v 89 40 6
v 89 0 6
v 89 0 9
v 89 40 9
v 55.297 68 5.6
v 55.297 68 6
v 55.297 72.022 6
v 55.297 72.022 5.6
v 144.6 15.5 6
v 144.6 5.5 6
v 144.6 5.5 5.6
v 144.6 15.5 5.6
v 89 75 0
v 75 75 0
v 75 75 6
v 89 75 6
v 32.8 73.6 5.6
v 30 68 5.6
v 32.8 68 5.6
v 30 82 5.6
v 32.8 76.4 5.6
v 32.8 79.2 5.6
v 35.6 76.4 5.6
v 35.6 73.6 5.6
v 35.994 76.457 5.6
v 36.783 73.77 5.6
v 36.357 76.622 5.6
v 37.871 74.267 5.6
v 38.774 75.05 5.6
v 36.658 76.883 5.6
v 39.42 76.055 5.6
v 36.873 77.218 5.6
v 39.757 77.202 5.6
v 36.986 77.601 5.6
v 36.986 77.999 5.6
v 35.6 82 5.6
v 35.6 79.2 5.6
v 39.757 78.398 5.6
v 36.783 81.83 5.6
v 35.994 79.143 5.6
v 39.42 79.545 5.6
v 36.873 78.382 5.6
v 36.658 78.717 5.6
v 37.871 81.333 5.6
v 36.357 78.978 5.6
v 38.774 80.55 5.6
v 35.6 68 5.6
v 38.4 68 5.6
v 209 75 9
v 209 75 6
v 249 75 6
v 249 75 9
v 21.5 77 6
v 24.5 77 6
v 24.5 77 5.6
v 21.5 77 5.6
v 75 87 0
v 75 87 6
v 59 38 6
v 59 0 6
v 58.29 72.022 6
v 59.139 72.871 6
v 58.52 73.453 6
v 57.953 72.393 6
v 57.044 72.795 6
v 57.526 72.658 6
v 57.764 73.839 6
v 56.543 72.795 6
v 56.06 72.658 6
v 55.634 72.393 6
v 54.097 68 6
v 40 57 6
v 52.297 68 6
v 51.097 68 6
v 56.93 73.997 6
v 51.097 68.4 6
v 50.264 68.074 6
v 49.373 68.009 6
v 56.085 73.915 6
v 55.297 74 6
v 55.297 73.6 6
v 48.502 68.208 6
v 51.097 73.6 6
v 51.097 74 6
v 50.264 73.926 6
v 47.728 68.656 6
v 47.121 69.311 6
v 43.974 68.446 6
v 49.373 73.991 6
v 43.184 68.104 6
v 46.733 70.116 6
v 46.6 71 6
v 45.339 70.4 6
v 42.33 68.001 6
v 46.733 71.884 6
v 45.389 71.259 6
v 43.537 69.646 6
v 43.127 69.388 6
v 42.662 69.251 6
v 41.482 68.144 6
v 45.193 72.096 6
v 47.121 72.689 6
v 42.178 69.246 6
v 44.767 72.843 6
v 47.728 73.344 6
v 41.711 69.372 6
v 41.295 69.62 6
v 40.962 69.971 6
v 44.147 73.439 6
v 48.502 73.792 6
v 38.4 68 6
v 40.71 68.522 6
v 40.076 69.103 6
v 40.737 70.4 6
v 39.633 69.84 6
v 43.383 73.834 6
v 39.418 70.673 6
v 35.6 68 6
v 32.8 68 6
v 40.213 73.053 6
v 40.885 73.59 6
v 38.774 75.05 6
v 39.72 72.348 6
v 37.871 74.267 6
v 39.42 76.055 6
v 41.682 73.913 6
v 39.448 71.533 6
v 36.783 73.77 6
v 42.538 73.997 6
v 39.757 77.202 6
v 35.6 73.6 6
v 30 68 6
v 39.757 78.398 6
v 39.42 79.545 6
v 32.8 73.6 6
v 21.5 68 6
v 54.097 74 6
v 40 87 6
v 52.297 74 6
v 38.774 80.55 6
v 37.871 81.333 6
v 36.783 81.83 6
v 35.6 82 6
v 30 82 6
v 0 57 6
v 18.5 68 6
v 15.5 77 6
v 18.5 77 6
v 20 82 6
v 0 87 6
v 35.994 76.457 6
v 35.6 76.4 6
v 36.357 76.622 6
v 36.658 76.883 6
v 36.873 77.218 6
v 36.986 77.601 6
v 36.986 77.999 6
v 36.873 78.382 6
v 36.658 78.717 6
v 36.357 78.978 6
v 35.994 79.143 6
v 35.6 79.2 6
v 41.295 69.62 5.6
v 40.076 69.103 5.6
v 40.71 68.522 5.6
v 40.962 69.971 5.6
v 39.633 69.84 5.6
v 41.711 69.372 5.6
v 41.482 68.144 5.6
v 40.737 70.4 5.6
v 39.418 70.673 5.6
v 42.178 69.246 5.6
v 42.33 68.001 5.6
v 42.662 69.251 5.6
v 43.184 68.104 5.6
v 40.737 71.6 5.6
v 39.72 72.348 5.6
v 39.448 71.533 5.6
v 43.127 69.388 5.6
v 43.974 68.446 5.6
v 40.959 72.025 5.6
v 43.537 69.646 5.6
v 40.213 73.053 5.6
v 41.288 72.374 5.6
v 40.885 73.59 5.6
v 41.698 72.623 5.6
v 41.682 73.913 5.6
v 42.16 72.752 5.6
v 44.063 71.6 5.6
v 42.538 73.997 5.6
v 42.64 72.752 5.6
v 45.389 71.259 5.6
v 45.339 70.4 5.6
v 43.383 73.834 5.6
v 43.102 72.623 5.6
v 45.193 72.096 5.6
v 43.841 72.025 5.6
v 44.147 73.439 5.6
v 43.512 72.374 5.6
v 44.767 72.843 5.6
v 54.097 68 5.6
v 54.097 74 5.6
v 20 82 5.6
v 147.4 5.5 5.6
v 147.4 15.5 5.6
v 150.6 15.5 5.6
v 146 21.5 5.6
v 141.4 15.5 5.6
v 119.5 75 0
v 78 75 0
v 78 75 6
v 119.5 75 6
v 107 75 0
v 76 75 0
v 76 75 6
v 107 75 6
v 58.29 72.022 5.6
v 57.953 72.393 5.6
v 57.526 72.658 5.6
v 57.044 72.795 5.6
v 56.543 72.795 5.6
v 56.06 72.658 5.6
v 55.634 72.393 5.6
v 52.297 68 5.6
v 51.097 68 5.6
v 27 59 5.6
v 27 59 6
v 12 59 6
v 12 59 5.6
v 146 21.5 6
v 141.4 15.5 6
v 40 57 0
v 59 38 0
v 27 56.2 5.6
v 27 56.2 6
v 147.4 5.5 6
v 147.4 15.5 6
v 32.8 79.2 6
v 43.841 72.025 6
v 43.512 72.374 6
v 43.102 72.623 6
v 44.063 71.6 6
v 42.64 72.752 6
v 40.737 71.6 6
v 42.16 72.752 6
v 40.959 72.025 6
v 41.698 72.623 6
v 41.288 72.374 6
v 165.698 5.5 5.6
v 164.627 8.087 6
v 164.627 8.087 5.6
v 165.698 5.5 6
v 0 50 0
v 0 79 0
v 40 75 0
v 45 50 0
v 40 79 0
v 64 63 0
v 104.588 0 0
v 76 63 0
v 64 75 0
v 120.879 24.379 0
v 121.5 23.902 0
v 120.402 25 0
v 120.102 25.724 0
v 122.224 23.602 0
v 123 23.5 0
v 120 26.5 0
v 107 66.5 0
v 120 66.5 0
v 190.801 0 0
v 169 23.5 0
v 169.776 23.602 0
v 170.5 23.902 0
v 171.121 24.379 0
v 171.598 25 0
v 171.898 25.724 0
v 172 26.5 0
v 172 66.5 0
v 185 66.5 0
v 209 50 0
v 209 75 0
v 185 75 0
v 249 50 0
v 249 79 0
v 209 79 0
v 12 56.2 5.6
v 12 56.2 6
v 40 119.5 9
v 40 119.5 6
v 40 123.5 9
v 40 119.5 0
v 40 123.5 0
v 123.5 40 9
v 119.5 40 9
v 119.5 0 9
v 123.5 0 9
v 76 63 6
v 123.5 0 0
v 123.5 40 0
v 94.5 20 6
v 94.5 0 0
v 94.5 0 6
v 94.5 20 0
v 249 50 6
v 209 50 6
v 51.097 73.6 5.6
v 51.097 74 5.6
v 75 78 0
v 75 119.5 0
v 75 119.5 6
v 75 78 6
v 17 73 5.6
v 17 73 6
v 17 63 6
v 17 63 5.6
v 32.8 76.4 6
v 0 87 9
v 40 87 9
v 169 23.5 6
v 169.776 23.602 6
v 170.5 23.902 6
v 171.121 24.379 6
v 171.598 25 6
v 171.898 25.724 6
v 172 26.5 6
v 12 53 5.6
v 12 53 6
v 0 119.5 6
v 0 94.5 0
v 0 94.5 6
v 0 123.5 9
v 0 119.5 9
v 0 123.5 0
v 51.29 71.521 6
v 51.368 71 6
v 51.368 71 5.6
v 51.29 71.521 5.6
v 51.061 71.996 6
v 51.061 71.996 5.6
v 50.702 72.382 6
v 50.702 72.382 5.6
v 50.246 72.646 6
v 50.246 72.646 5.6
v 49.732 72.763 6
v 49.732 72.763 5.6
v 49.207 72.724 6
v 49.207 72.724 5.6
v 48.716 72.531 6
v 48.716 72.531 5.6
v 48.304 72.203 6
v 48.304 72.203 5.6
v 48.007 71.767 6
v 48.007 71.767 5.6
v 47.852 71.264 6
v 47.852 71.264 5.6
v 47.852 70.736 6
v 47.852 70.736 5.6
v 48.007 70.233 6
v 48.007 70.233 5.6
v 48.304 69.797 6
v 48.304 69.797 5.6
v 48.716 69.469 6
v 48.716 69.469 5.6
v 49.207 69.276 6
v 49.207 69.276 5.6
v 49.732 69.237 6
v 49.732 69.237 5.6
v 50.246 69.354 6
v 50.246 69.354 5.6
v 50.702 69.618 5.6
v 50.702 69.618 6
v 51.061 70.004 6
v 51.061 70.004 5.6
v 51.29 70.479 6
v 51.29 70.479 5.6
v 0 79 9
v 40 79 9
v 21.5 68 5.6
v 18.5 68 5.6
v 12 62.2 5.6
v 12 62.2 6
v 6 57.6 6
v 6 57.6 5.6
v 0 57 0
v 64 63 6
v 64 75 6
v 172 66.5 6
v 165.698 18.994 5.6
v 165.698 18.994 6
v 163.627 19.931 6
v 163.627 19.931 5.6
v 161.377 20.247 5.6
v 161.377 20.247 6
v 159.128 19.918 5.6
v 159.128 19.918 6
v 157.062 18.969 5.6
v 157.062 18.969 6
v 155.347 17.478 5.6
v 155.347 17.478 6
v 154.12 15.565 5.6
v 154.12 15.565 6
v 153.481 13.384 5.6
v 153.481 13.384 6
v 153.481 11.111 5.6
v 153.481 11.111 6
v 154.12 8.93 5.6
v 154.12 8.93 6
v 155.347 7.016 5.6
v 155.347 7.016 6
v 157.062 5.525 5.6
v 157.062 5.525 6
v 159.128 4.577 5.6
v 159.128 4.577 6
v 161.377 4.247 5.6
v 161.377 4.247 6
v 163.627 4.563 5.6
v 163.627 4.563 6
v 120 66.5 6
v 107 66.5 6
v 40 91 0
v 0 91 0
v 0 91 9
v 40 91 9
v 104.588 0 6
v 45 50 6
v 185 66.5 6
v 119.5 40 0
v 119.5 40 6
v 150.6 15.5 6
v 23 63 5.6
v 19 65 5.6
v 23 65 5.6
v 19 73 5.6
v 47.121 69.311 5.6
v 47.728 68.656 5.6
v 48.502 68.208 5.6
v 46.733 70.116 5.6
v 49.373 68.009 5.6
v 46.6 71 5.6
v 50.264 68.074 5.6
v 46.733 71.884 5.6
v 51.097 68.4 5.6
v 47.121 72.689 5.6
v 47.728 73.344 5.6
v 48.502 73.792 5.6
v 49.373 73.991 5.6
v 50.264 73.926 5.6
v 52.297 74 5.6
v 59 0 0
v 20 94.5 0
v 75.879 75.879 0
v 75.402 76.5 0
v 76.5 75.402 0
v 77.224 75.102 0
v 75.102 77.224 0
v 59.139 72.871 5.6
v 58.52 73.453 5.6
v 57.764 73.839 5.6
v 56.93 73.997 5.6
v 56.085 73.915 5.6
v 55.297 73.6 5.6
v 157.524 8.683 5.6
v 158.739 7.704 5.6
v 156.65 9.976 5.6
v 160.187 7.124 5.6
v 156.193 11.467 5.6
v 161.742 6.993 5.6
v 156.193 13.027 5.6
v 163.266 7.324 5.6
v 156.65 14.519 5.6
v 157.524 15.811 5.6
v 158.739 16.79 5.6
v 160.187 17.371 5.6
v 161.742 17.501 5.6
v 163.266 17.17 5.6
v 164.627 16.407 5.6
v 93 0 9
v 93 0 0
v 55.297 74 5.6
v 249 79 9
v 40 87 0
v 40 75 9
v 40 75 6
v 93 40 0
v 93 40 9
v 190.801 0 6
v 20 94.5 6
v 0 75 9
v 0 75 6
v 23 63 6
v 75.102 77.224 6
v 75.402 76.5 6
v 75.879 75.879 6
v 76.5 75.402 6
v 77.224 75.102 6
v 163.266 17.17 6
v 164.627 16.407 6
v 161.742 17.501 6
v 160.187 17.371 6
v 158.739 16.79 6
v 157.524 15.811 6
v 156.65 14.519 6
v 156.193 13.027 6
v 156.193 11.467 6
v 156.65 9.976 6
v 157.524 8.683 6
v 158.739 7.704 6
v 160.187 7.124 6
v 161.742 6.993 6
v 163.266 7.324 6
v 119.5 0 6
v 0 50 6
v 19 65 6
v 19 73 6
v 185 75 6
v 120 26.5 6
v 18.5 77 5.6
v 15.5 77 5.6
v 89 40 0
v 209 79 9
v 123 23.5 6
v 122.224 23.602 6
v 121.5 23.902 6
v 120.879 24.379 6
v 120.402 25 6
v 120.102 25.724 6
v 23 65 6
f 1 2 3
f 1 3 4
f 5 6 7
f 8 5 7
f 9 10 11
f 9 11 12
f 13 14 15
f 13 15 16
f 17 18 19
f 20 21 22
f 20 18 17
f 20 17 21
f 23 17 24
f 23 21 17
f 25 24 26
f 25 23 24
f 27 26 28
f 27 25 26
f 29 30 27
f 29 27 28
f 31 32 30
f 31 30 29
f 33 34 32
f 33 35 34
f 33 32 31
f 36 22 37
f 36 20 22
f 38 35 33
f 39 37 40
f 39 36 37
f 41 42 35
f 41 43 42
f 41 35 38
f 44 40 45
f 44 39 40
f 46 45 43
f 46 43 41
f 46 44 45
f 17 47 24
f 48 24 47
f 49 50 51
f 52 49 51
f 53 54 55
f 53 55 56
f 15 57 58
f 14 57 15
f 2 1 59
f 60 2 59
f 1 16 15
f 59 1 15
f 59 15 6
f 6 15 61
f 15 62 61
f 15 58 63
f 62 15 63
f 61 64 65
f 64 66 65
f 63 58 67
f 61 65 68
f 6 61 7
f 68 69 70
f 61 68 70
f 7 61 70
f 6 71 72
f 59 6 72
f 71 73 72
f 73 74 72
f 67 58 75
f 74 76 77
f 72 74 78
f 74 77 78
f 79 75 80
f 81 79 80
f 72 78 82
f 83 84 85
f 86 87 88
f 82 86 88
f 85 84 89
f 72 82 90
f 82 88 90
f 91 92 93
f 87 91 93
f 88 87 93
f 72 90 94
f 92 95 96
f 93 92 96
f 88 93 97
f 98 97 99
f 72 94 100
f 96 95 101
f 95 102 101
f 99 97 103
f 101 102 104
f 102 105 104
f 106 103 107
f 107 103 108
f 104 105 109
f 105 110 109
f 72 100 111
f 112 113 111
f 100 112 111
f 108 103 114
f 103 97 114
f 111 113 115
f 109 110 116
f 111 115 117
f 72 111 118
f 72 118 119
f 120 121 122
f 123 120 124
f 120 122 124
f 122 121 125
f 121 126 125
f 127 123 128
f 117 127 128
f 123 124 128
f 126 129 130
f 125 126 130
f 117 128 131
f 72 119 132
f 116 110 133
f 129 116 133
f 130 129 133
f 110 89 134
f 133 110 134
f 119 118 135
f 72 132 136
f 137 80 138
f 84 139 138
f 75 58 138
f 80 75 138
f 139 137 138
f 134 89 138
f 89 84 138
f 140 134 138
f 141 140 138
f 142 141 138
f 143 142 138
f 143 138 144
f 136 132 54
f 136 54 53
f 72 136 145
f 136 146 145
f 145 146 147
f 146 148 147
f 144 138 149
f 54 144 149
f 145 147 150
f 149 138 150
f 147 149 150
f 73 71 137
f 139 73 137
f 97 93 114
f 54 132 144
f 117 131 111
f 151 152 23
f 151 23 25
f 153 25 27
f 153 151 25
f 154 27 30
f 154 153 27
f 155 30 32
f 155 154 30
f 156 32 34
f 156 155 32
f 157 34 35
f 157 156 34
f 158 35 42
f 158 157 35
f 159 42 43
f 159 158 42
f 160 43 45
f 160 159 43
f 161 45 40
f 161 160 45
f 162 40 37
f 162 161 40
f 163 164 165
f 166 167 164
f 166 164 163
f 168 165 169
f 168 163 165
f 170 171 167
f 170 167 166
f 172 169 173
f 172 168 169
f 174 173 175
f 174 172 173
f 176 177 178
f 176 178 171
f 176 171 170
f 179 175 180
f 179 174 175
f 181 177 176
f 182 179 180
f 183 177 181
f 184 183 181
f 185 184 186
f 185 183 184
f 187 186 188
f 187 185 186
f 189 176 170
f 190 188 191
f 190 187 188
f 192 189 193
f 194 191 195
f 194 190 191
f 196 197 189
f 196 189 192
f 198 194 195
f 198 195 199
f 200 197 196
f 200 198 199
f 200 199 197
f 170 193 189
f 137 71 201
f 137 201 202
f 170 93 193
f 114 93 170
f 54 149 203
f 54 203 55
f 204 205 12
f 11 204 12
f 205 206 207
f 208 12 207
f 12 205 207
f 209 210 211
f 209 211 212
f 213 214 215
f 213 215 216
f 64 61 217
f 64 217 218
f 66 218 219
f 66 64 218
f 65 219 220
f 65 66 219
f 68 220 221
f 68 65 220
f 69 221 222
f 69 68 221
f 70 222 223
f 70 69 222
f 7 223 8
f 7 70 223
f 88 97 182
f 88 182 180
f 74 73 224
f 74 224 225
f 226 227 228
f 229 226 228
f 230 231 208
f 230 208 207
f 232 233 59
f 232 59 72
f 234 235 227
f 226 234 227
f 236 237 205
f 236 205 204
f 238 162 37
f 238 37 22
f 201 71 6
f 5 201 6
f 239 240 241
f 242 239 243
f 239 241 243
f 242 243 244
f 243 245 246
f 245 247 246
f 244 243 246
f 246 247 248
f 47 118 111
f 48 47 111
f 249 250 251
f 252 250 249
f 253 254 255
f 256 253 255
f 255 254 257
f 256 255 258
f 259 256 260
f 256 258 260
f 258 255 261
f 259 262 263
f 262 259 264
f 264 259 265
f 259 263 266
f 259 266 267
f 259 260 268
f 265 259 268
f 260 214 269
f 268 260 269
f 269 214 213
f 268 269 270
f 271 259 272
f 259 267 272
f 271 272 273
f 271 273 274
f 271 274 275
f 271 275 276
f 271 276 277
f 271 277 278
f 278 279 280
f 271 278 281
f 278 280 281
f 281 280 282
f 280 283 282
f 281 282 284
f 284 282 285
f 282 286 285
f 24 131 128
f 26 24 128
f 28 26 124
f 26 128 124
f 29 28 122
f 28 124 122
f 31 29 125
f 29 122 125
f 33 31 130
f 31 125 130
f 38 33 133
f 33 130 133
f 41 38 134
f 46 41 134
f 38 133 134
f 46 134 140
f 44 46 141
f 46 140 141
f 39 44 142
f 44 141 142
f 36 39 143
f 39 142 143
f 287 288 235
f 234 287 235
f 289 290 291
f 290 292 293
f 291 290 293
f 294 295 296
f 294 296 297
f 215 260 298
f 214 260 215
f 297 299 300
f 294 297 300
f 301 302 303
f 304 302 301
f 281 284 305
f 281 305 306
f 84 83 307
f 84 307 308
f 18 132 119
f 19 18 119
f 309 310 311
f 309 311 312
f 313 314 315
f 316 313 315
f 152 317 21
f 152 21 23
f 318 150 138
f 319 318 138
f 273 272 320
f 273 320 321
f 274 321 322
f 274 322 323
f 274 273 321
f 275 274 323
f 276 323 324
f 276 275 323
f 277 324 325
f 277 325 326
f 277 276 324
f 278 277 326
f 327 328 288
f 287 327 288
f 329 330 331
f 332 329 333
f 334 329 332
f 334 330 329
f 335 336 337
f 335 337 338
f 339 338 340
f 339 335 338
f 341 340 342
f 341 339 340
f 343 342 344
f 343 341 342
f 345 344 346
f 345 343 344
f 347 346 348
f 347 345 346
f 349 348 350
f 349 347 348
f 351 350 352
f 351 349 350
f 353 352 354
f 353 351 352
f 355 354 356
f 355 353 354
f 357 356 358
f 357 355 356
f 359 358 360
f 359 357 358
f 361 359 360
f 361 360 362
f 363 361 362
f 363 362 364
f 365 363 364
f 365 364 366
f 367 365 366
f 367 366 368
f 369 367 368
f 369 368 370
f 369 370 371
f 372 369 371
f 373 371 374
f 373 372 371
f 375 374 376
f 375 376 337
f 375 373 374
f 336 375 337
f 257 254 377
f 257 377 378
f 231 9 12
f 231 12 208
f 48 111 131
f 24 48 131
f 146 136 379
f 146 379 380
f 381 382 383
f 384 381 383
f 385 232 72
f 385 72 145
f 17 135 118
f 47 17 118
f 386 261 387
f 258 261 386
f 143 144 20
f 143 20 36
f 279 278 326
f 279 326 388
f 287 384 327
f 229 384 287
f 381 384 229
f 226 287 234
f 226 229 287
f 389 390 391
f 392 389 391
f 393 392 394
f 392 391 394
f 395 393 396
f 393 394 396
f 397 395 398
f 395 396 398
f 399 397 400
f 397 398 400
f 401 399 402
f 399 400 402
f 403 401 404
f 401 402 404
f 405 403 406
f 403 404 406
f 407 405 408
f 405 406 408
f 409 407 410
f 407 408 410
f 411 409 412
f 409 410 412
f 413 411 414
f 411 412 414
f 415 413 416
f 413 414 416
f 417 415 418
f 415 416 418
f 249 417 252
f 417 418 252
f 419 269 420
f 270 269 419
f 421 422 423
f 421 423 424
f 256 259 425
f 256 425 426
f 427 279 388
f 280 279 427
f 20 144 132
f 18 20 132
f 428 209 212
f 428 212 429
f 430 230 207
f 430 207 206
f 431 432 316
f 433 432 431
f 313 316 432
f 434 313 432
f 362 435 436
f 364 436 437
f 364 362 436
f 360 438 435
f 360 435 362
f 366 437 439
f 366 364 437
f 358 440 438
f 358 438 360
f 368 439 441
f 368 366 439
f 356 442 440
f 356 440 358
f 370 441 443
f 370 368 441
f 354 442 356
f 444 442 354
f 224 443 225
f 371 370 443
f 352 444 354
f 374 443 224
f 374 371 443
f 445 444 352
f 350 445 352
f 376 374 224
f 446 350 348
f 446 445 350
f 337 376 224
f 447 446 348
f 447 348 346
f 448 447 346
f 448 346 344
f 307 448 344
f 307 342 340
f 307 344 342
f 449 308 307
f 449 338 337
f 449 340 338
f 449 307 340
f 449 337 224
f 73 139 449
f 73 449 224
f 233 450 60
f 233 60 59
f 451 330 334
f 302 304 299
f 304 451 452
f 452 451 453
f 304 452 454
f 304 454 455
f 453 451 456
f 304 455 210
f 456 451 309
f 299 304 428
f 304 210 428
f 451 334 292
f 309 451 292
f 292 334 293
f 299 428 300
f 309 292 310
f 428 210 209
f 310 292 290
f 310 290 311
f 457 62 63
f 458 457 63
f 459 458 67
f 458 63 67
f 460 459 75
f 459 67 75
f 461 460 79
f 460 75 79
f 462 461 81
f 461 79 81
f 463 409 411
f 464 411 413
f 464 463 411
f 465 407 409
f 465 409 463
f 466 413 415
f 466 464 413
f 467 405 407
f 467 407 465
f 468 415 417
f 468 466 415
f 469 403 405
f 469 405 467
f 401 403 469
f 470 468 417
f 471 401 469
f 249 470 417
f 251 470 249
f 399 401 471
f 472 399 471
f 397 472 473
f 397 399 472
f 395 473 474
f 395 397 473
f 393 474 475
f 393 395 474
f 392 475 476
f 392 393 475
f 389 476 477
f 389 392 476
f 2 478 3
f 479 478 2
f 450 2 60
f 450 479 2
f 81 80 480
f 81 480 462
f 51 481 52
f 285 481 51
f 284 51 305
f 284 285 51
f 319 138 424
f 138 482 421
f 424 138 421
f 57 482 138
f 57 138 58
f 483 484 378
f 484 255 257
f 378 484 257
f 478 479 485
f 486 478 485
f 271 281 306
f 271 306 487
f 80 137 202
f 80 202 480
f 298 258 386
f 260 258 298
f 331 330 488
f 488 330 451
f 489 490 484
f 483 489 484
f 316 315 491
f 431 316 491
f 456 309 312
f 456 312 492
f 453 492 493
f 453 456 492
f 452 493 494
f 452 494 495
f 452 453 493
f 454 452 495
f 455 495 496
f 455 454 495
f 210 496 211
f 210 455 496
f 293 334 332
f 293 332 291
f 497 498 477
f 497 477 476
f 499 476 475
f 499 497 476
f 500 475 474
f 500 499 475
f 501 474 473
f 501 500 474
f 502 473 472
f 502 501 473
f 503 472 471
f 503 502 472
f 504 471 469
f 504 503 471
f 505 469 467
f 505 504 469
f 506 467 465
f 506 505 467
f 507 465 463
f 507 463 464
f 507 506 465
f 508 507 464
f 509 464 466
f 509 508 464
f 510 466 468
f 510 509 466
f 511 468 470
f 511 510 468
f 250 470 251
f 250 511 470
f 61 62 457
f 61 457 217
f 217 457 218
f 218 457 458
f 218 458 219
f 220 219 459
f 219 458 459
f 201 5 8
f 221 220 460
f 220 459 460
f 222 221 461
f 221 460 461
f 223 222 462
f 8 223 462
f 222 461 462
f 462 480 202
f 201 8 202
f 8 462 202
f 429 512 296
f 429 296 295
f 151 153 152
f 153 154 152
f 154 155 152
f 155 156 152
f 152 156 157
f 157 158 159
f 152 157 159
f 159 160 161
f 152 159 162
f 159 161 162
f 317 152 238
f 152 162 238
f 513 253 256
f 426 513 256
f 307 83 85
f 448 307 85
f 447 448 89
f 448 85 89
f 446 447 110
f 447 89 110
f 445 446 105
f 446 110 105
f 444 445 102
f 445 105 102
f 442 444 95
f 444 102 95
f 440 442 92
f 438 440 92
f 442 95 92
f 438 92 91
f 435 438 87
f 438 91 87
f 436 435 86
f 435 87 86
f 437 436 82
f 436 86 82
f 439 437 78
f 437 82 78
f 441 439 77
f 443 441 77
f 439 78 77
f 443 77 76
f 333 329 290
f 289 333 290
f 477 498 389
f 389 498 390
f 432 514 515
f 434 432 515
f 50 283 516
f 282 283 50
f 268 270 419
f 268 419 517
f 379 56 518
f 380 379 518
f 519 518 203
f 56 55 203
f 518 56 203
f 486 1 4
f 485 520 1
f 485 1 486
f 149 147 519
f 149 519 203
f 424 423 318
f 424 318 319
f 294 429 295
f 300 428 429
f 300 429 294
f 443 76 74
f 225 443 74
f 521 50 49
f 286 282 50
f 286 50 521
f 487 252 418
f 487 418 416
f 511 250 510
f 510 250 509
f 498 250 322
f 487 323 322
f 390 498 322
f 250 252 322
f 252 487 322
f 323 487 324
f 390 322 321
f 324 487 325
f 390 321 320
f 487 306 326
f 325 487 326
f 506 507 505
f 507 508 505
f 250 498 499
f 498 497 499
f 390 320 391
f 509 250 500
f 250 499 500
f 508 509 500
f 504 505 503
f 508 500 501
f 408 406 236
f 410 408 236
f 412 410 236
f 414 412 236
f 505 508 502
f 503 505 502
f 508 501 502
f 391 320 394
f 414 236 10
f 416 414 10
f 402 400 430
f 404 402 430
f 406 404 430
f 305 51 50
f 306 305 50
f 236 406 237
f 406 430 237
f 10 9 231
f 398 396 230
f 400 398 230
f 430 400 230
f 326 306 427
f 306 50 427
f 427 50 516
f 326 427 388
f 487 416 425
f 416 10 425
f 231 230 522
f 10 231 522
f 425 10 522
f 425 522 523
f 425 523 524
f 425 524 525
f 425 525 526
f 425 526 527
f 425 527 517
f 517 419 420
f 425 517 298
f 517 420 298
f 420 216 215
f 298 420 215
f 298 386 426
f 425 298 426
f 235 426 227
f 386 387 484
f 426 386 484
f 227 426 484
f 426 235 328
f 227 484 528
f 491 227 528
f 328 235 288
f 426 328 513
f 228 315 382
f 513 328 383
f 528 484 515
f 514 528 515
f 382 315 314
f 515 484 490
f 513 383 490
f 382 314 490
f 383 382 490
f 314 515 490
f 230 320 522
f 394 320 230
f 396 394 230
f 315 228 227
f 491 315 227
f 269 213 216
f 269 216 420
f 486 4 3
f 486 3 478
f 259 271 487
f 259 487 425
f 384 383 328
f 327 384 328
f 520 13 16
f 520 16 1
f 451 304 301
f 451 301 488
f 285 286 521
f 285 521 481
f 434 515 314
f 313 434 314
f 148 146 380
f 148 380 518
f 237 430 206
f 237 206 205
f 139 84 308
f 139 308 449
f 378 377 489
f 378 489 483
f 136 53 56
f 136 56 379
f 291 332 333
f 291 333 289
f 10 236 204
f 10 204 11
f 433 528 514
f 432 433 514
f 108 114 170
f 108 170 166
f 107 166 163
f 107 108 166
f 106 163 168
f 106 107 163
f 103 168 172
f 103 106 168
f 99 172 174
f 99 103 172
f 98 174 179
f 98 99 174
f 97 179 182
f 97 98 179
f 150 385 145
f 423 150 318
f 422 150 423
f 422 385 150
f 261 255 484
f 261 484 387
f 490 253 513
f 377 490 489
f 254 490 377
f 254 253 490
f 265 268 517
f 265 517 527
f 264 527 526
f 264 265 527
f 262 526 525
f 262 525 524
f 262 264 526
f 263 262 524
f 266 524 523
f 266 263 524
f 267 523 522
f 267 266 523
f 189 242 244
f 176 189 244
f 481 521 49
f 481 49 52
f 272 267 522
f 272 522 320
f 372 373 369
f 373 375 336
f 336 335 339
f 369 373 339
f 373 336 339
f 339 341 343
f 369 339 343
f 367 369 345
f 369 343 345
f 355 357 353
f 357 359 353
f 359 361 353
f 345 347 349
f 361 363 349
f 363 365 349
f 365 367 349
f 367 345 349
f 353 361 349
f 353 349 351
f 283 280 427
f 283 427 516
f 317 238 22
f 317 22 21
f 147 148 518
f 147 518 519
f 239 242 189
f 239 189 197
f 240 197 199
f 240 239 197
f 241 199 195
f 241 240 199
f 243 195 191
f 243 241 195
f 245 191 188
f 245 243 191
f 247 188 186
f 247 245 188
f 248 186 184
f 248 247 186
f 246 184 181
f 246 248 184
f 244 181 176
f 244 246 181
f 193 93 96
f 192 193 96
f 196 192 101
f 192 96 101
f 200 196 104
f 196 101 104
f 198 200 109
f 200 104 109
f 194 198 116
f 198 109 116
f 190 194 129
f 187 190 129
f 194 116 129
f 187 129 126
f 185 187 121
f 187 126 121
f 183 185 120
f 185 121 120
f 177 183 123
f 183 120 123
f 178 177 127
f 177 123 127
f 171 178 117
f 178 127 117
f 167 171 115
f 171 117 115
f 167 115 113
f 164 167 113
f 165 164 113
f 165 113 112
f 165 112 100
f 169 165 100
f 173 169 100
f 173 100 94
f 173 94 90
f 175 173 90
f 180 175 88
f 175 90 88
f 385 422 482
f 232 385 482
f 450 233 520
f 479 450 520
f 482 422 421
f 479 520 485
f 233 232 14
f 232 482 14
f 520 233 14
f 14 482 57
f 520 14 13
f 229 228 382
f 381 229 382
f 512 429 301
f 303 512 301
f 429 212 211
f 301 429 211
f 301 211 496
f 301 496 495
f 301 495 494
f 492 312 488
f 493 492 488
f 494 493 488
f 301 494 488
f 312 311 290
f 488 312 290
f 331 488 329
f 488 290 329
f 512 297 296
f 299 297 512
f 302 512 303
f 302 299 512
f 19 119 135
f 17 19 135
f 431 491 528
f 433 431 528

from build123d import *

# Parameters (mm, degrees)
PAD_DEPTH       = 6
SKETCH001_W     = 40
SKETCH001_H     = 4
SKETCH001_W_2   = 4
SKETCH001_H_2   = 40
PAD001_DEPTH    = 9
PAD002_DEPTH    = 6
SKETCH003_W     = 40
SKETCH003_H     = 4
SKETCH003_W_2   = 4
SKETCH003_H_2   = 40
PAD003_DEPTH    = 9
SKETCH004_R     = 1.768096
POCKET_DEPTH    = 0.4
PAD004_DEPTH    = 6
SKETCH007_W     = 40
SKETCH007_H     = 4
PAD005_DEPTH    = 9
POCKET001_DEPTH = 0.4


with BuildPart() as leftrightmotor:
    # Sketch → Pad (new body)
    with BuildSketch(Plane.XY):
        with BuildLine():
            Line((0, 119.5), (75, 119.5))
            Line((75, 119.5), (75, 78))
            ThreePointArc((75, 78), (75.87868, 75.87868), (78, 75))
            Line((78, 75), (119.5, 75))
            Line((119.5, 75), (119.5, 0))
            Line((119.5, 0), (94.5, 0))
            Line((94.5, 0), (94.5, 20))
            Line((94.5, 20), (20, 94.5))
            Line((0, 94.5), (20, 94.5))
            Line((0, 119.5), (0, 94.5))
        make_face()
    extrude(amount=PAD_DEPTH)

    # Sketch001 → Pad001 (join)
    with BuildSketch(Plane.XY):
        with Locations((20, 121.5)):
            Rectangle(SKETCH001_W, SKETCH001_H)
        with Locations((121.5, 20)):
            Rectangle(SKETCH001_W_2, SKETCH001_H_2)
    extrude(amount=PAD001_DEPTH)


with BuildPart() as cablecorner:
    # Sketch002 → Pad002 (new body)
    with BuildSketch(Plane.XY):
        Polygon((0, 87), (75, 87), (75, 75), (89, 75), (89, 0), (59, 0), (59, 38), (40, 57), (0, 57), align=None)
    extrude(amount=PAD002_DEPTH)

    # Sketch003 → Pad003 (join)
    with BuildSketch(Plane.XY):
        with Locations((20, 89)):
            Rectangle(SKETCH003_W, SKETCH003_H)
        with Locations((91, 20)):
            Rectangle(SKETCH003_W_2, SKETCH003_H_2)
    extrude(amount=PAD003_DEPTH)

    # Sketch004 (on Face3 of Pad003) → Pocket (cut)
    with BuildSketch(Plane.XY.offset(6)):
        Polygon((18.5, 68), (18.5, 77), (15.5, 77), (20, 82), (24.5, 77), (21.5, 77), (21.5, 68), align=None)
        with BuildLine():
            Line((30, 82), (30, 68))
            Line((30, 68), (32.8, 68))
            Line((32.8, 68), (32.8, 73.6))
            Line((32.8, 73.6), (35.6, 68))
            Line((35.6, 68), (38.4, 68))
            Line((38.4, 68), (35.6, 73.6))
            ThreePointArc((35.6, 73.6), (39.8, 77.8), (35.6, 82))
            Line((30, 82), (35.6, 82))
        make_face()
        with BuildLine():
            Line((35.6, 79.2), (32.8, 79.2))
            Line((32.8, 79.2), (32.8, 76.4))
            Line((32.8, 76.4), (35.6, 76.4))
            ThreePointArc((35.6, 76.4), (37, 77.8), (35.6, 79.2))
        make_face(mode=Mode.SUBTRACT)
        with BuildLine():
            ThreePointArc((45.339388, 70.4), (39.94105, 72.718594), (43.973586, 68.445822))
            Line((43.536822, 69.645822), (43.973586, 68.445822))
            ThreePointArc((40.736822, 70.4), (41.940153, 69.29275), (43.536822, 69.645822))
            Line((45.339388, 70.4), (40.736822, 70.4))
        make_face()
        with BuildLine():
            ThreePointArc((44.063178, 71.6), (42.4, 72.768096), (40.736822, 71.6))
            Line((44.063178, 71.6), (40.736822, 71.6))
        make_face(mode=Mode.SUBTRACT)
        with BuildLine():
            ThreePointArc((51.096663, 73.6), (46.6, 71), (51.096663, 68.4))
            Line((51.096663, 68.4), (51.096663, 68))
            Line((52.296663, 68), (51.096663, 68))
            Line((52.296663, 74), (52.296663, 68))
            Line((51.096663, 74), (52.296663, 74))
            Line((51.096663, 73.6), (51.096663, 74))
        make_face()
        with Locations((49.6, 71)):
            Circle(SKETCH004_R, mode=Mode.SUBTRACT)
        with BuildLine():
            Line((54.096663, 68), (54.096663, 74))
            Line((54.096663, 74), (55.296663, 74))
            Line((55.296663, 74), (55.296663, 73.6))
            ThreePointArc((59.138517, 72.87085), (57.352714, 73.947386), (55.296663, 73.6))
            Line((59.138517, 72.87085), (58.289989, 72.022322))
            ThreePointArc((58.289989, 72.022322), (56.793326, 72.812496), (55.296663, 72.022322))
            Line((55.296663, 68), (55.296663, 72.022322))
            Line((54.096663, 68), (55.296663, 68))
        make_face()
    extrude(amount=-POCKET_DEPTH, mode=Mode.SUBTRACT)


with BuildPart() as rearmotor:
    # Sketch006 → Pad004 (new body)
    with BuildSketch(Plane.XY):
        with BuildLine():
            Line((0, 75), (64, 75))
            Line((64, 75), (64, 63))
            Line((64, 63), (76, 63))
            Line((76, 63), (76, 75))
            Line((76, 75), (107, 75))
            Line((107, 75), (107, 66.5))
            Line((107, 66.5), (120, 66.5))
            Line((120, 66.5), (120, 26.5))
            ThreePointArc((120, 26.5), (120.87868, 24.37868), (123, 23.5))
            Line((123, 23.5), (169, 23.5))
            ThreePointArc((169, 23.5), (171.12132, 24.37868), (172, 26.5))
            Line((172, 26.5), (172, 66.5))
            Line((172, 66.5), (185, 66.5))
            Line((185, 66.5), (185, 75))
            Line((185, 75), (249, 75))
            Line((249, 75), (249, 50))
            Line((249, 50), (209, 50))
            Line((209, 50), (190.801488, 0))
            Line((190.801488, 0), (104.58768, 0))
            Line((104.58768, 0), (45, 50))
            Line((0, 50), (45, 50))
            Line((0, 50), (0, 75))
        make_face()
    extrude(amount=PAD004_DEPTH)

    # Sketch007 → Pad005 (join)
    with BuildSketch(Plane.XY):
        with Locations((20, 77)):
            Rectangle(SKETCH007_W, SKETCH007_H)
        with Locations((229, 77)):
            Rectangle(SKETCH007_W, SKETCH007_H)
    extrude(amount=PAD005_DEPTH)

    # Sketch008 (on Face2 of Pad005) → Pocket001 (cut)
    with BuildSketch(Plane.XY.offset(6)):
        Polygon((17, 73), (17, 63), (23, 63), (23, 65), (19, 65), (19, 73), align=None)
        Polygon((12, 62.2), (6, 57.6), (12, 53), (12, 56.2), (27, 56.2), (27, 59), (12, 59), align=None)
        Polygon((141.4, 15.5), (146, 21.5), (150.6, 15.5), (147.4, 15.5), (147.4, 5.5), (144.6, 5.5), (144.6, 15.5), align=None)
        with BuildLine():
            ThreePointArc((165.698397, 18.994263), (153.4, 12.247132), (165.698397, 5.5))
            Line((164.626883, 8.086863), (165.698397, 5.5))
            ThreePointArc((164.626883, 16.4074), (156.134963, 12.247132), (164.626883, 8.086863))
            Line((164.626883, 16.4074), (165.698397, 18.994263))
        make_face()
    extrude(amount=-POCKET001_DEPTH, mode=Mode.SUBTRACT)


solid = Compound([leftrightmotor.part, cablecorner.part, rearmotor.part])
